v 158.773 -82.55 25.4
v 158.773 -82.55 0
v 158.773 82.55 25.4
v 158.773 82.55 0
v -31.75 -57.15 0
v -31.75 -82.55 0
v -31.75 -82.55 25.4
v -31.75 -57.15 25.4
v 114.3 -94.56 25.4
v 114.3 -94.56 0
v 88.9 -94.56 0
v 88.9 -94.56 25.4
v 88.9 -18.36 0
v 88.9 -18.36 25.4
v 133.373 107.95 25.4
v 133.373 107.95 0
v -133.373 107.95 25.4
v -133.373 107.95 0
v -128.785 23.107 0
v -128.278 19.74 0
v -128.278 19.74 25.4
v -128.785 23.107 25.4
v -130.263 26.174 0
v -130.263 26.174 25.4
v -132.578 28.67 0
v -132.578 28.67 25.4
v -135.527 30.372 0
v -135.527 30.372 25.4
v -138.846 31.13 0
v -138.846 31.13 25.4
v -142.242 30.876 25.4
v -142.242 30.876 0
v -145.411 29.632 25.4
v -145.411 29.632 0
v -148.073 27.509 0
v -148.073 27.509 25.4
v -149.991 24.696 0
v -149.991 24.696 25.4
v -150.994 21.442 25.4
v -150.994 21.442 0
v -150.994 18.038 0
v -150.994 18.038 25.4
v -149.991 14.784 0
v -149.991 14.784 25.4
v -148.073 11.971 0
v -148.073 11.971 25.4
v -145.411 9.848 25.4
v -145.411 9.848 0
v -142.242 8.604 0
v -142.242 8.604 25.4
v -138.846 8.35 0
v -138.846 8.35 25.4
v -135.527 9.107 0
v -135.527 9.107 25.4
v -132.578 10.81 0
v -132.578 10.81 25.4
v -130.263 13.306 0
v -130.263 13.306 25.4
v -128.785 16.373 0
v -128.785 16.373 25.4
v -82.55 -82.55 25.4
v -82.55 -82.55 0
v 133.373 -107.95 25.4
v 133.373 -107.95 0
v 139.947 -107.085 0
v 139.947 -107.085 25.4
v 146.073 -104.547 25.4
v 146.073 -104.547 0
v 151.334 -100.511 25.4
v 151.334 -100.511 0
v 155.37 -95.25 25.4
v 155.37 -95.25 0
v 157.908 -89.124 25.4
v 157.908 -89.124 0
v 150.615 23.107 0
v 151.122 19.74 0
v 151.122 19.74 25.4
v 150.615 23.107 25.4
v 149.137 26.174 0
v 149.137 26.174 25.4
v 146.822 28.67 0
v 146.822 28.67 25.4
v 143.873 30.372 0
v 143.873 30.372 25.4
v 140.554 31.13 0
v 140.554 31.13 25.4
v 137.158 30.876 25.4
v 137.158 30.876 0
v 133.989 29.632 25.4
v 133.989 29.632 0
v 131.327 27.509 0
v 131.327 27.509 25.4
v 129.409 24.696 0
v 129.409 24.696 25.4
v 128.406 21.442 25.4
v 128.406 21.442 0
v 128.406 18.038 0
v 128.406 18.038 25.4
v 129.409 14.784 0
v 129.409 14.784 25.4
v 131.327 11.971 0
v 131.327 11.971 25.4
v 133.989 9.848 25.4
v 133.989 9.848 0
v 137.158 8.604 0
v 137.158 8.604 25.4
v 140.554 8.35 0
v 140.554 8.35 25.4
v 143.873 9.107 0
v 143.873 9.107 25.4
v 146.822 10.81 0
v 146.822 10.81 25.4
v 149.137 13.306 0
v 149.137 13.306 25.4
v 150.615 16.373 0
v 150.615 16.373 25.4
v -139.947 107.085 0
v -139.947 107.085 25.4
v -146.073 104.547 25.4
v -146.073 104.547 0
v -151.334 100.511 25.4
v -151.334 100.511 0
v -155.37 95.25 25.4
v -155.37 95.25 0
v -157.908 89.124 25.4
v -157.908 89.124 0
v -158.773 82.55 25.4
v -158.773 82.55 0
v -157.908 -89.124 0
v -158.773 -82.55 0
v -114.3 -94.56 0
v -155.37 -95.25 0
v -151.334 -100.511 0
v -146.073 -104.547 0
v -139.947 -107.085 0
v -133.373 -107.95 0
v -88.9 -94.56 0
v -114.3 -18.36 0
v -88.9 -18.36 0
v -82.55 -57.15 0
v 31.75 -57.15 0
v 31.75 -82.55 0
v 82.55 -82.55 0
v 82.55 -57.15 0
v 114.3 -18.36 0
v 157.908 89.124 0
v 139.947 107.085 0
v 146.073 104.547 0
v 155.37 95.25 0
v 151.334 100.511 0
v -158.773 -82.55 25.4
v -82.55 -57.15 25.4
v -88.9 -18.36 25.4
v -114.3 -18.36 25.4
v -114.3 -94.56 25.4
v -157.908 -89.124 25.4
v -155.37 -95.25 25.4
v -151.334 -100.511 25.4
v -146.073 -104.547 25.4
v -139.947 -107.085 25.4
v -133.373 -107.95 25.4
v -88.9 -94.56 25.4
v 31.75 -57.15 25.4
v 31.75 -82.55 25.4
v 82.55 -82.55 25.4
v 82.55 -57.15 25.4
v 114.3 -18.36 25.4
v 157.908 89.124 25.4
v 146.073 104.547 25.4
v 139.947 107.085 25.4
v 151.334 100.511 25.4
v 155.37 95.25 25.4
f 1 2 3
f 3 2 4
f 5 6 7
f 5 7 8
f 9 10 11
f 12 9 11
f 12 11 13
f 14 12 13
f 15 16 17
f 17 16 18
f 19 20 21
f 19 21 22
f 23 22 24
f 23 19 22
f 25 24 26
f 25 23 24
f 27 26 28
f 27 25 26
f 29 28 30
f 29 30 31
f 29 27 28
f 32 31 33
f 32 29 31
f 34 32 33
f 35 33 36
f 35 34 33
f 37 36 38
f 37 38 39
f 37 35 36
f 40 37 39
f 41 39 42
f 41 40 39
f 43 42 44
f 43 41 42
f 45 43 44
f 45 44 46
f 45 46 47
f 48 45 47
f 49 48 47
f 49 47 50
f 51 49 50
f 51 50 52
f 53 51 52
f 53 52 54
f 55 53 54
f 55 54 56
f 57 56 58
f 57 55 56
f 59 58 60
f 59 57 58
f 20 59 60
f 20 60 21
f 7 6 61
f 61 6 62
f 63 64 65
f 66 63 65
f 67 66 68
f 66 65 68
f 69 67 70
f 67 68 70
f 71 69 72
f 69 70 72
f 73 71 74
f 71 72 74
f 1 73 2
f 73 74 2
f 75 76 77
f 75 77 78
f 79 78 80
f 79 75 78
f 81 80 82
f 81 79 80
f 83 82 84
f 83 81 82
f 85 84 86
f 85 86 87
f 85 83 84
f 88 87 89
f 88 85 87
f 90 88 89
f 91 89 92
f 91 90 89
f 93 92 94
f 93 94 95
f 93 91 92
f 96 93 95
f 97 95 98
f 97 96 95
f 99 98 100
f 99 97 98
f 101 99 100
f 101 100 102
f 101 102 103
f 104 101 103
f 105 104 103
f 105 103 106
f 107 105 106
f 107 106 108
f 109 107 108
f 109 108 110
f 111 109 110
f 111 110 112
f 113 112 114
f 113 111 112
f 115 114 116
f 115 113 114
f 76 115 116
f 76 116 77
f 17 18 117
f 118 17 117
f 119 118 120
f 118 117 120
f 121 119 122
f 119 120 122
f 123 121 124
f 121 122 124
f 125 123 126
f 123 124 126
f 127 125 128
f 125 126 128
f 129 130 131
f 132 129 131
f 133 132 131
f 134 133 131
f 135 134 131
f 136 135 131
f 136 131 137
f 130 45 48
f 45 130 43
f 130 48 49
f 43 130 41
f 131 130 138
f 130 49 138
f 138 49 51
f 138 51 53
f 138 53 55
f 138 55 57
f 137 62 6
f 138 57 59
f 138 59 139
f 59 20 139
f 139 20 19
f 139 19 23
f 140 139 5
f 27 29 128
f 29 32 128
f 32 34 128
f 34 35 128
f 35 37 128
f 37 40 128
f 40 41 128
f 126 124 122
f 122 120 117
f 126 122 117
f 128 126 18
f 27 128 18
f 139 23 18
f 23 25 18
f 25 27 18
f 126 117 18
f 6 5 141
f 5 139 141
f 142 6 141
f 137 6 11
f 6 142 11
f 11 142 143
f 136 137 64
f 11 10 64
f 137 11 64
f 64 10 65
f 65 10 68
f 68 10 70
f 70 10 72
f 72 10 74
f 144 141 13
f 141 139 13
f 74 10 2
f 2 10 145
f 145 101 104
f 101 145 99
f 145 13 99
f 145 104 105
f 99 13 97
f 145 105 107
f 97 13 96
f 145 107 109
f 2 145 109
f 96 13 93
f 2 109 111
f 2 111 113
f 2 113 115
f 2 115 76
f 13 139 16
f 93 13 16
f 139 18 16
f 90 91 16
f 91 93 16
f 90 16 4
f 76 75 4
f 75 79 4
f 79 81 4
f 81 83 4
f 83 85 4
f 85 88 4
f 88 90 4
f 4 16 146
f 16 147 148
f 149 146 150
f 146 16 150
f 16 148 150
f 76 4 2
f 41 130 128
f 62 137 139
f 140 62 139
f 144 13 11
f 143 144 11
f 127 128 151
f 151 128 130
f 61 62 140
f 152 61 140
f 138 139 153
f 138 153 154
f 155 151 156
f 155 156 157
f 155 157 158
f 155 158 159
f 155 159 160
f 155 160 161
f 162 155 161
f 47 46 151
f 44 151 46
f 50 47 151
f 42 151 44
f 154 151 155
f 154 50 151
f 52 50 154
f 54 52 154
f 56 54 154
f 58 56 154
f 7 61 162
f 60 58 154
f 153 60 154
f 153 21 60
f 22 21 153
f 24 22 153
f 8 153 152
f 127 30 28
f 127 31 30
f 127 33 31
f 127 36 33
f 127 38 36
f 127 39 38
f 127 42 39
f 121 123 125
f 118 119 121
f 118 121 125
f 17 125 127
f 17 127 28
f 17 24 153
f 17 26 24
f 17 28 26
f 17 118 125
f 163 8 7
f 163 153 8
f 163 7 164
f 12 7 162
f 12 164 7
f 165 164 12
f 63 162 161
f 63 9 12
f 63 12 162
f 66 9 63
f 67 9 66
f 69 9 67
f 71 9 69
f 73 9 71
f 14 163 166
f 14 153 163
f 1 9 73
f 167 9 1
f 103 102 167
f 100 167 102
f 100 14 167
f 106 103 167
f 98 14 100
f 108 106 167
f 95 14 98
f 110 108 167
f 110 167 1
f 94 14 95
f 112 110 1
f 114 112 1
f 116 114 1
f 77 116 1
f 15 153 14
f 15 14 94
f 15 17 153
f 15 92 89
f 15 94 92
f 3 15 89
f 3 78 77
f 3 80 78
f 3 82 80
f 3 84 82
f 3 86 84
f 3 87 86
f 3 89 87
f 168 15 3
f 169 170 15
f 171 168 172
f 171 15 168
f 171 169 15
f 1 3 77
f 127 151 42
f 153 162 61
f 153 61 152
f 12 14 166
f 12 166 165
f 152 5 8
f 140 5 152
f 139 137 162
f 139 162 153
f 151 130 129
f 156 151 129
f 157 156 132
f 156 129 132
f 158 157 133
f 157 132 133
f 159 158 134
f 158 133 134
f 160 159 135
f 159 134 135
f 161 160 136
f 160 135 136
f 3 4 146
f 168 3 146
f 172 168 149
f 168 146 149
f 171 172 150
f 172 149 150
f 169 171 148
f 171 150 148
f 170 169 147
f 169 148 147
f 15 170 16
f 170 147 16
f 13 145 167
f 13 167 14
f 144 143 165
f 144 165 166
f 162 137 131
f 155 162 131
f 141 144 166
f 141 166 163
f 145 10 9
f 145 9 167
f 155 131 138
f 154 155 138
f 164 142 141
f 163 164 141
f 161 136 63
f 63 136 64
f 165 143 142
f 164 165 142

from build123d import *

# Parameters (mm, degrees)
SKETCH1_R                      = 11.422
BOSS_EXTRUDE1_DEPTH            = 25.4
SKETCH2_W                      = 50.8
SKETCH2_H                      = 25.4
FOAM_INSERT_CUT_THROUGHS_DEPTH = 25.4
SKETCH3_W                      = 25.4
SKETCH3_H                      = 76.2
CUT_EXTRUDE1_DEPTH             = 25.4


with BuildPart() as part:
    # Sketch1 → Boss-Extrude1 (new body)
    with BuildSketch(Plane.XY):
        with BuildLine():
            Line((-133.373251541, -107.95), (133.373251541, -107.95))
            ThreePointArc((133.373251541, -107.95), (151.333763783, -100.510512242), (158.773251541, -82.55))
            Line((158.773251541, -82.55), (158.773251541, 82.55))
            ThreePointArc((158.773251541, 82.55), (151.333763783, 100.510512242), (133.373251541, 107.95))
            Line((133.373251541, 107.95), (-133.373251541, 107.95))
            ThreePointArc((-133.373251541, 107.95), (-151.333763783, 100.510512242), (-158.773251541, 82.55))
            Line((-158.773251541, 82.55), (-158.773251541, -82.55))
            ThreePointArc((-158.773251541, -82.55), (-151.333763783, -100.510512242), (-133.373251541, -107.95))
        make_face()
        with Locations((-139.7, 19.739923182)):
            Circle(SKETCH1_R, mode=Mode.SUBTRACT)
        with Locations((139.7, 19.739923182)):
            Circle(SKETCH1_R, mode=Mode.SUBTRACT)
    extrude(amount=BOSS_EXTRUDE1_DEPTH)

    # Sketch2 → Foam Insert Cut-Throughs (cut)
    with BuildSketch(Plane(origin=(0, 0, 0), x_dir=(-1, 0, 0), z_dir=(0, 0, -1))):
        with Locations((-57.15, -69.85)):
            Rectangle(SKETCH2_W, SKETCH2_H)
        with Locations((57.15, -69.85)):
            Rectangle(SKETCH2_W, SKETCH2_H)
    extrude(amount=-FOAM_INSERT_CUT_THROUGHS_DEPTH, mode=Mode.SUBTRACT)

    # Sketch3 → Cut-Extrude1 (cut)
    with BuildSketch(Plane(origin=(0, 0, 0), x_dir=(-1, 0, 0), z_dir=(0, 0, -1))):
        with Locations((101.6, -56.460076818)):
            Rectangle(SKETCH3_W, SKETCH3_H)
        with Locations((-101.6, -56.460076818)):
            Rectangle(SKETCH3_W, SKETCH3_H)
    extrude(amount=-CUT_EXTRUDE1_DEPTH, mode=Mode.SUBTRACT)


solid = part.part
